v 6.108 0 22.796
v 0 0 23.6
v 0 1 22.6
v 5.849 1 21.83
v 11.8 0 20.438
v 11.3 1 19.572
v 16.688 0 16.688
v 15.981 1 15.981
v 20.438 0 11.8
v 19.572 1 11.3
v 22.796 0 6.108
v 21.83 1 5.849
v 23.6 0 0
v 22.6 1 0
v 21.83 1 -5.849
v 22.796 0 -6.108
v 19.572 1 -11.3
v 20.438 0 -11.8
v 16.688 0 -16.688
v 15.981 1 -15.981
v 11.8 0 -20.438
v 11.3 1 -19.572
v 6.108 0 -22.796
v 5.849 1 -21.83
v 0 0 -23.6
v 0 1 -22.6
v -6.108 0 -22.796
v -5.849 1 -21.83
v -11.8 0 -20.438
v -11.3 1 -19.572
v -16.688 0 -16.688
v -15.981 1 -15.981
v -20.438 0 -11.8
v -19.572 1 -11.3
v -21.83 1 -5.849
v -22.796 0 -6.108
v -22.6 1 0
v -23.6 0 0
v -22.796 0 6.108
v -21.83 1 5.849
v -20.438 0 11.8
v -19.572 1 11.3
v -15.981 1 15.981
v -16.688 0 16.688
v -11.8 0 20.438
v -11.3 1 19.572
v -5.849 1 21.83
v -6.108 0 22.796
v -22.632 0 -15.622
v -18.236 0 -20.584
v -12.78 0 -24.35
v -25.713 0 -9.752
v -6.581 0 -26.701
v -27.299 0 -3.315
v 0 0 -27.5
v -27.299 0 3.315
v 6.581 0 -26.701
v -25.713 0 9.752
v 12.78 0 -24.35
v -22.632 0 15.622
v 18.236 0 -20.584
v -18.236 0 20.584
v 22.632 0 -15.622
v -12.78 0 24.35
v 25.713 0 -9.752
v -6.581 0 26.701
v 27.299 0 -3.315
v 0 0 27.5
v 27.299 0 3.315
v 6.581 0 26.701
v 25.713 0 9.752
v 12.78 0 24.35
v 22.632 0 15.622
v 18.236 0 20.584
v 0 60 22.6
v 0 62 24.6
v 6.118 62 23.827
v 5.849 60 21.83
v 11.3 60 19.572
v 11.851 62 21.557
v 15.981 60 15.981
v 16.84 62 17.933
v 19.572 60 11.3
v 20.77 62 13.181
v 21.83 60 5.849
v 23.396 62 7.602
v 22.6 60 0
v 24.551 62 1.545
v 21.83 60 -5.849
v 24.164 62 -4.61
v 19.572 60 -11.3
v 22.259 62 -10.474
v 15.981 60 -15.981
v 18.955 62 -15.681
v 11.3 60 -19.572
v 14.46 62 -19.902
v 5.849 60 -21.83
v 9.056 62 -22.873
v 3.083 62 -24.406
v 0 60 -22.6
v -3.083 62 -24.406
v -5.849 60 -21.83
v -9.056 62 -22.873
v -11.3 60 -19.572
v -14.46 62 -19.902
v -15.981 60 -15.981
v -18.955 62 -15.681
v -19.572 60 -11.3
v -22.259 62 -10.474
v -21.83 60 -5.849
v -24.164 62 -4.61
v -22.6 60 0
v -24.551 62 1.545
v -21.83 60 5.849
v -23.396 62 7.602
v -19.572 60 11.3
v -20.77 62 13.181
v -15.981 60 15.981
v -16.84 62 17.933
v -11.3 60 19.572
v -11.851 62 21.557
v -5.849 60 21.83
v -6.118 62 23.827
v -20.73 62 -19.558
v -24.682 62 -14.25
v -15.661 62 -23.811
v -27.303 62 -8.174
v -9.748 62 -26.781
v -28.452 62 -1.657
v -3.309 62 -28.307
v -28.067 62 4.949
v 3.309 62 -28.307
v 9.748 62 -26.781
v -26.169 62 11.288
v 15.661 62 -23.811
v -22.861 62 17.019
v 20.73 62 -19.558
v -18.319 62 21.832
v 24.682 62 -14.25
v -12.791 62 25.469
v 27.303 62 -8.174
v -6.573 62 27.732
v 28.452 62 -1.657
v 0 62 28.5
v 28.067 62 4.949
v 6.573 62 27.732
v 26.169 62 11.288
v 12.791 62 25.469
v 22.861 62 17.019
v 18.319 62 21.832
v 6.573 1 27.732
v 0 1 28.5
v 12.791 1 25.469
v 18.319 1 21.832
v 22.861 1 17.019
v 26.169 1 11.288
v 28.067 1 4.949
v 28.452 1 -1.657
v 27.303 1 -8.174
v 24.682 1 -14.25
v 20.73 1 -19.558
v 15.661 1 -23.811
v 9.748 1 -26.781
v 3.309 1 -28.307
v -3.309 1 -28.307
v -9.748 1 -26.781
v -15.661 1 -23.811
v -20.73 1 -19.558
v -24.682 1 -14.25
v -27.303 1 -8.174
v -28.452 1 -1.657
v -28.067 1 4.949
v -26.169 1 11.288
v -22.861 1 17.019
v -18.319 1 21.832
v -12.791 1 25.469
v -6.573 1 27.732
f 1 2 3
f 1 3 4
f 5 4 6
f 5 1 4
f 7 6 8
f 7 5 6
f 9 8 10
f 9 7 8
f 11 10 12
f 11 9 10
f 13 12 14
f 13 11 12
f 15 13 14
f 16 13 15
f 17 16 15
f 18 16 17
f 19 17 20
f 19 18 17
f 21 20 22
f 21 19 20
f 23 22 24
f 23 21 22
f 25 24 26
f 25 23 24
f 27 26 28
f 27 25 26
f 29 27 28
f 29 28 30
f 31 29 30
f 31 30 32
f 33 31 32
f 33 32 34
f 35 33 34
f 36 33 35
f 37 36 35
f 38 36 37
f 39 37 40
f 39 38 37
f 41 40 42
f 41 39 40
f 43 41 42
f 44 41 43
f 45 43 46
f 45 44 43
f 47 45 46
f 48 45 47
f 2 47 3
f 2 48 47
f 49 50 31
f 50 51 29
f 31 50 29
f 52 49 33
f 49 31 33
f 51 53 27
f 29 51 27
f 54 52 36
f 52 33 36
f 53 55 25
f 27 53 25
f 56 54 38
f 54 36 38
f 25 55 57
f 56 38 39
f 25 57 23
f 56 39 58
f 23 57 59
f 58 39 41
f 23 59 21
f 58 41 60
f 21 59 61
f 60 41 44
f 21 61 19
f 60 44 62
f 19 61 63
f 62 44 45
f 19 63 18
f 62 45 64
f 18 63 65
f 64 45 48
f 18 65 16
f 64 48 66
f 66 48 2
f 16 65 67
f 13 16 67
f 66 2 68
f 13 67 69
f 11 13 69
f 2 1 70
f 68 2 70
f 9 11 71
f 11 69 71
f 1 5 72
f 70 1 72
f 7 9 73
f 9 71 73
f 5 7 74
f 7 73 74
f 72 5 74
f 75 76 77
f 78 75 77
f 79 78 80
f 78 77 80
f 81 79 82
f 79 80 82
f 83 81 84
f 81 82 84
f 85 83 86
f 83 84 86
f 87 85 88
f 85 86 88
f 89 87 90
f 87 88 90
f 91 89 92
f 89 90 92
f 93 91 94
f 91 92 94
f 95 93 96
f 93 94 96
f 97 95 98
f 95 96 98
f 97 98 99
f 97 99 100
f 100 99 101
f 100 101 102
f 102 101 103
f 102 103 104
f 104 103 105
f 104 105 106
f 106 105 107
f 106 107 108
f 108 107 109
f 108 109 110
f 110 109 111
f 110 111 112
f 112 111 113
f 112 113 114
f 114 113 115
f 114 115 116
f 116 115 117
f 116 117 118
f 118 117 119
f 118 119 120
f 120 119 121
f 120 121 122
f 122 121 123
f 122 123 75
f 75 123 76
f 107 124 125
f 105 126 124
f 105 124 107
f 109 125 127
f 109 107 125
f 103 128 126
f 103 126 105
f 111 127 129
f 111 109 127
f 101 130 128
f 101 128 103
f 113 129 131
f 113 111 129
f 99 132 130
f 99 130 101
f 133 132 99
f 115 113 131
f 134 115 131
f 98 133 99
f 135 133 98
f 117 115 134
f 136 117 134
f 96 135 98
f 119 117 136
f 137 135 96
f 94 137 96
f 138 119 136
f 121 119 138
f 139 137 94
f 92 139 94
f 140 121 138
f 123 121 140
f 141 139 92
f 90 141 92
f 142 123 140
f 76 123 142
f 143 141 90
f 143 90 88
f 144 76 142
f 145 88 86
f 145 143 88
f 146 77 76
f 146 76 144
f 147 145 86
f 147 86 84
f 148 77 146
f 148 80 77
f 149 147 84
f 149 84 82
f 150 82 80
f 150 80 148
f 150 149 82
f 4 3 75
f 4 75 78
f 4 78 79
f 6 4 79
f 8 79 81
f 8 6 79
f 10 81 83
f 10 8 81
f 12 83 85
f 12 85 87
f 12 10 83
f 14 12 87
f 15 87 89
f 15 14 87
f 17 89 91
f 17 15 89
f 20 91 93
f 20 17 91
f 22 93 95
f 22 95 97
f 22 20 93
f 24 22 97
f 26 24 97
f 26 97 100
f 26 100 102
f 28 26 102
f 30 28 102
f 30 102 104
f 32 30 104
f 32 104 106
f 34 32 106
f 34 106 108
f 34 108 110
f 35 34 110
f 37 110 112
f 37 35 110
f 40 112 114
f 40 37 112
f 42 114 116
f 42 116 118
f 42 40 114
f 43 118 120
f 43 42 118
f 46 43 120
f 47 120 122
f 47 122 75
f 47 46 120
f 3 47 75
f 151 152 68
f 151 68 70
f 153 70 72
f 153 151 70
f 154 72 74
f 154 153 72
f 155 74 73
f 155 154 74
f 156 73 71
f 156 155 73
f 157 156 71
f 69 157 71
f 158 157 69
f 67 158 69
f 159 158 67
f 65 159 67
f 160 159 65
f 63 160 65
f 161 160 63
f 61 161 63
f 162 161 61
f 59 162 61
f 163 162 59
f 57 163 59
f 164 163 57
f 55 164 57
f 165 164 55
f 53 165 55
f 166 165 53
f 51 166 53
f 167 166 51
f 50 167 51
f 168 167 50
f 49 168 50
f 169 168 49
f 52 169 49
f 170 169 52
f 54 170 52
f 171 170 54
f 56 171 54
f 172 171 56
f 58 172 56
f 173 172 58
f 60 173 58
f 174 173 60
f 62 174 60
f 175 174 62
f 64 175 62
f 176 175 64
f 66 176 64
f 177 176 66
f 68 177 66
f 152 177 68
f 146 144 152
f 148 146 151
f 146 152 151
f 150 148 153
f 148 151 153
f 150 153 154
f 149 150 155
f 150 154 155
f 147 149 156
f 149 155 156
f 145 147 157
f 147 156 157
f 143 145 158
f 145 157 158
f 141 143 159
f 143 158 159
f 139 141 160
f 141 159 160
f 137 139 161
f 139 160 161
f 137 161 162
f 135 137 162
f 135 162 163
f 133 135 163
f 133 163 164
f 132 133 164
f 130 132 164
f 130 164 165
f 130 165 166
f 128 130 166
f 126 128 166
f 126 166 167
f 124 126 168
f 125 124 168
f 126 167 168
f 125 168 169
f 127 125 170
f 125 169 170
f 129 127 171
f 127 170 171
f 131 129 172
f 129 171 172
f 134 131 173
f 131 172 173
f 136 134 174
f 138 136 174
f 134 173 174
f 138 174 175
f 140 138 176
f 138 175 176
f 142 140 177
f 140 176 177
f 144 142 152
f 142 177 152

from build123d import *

# Parameters (mm, degrees)
SKETCH2_R           = 28.5
SKETCH2_R_2         = 22.6
BOSS_EXTRUDE1_DEPTH = 62
CHAMFER1_SIZE       = 2
CHAMFER2_SIZE       = 1
CHAMFER3_SIZE       = 1


with BuildPart() as part:
    # Sketch2 → Boss-Extrude1 (new body)
    with BuildSketch(Plane(origin=(0, 0, 0), x_dir=(1, 0, 0), z_dir=(0, 1, 0))):
        with Locations(Location((0, 0, 0), (0, 0, 270))):
            Circle(SKETCH2_R)
        with Locations(Location((0, 0, 0), (0, 0, 270))):
            Circle(SKETCH2_R_2, mode=Mode.SUBTRACT)
    extrude(amount=BOSS_EXTRUDE1_DEPTH)

    # Chamfer1
    chamfer1_edges = [part.edges().sort_by_distance(p)[0] for p in [
        (0, 62, -22.6),
    ]]
    chamfer(chamfer1_edges, length=CHAMFER1_SIZE)

    # Chamfer2
    chamfer2_edges = [part.edges().sort_by_distance(p)[0] for p in [
        (0, 0, -22.6),
    ]]
    chamfer(chamfer2_edges, length=CHAMFER2_SIZE)

    # Chamfer3
    chamfer3_edges = [part.edges().sort_by_distance(p)[0] for p in [
        (0, 0, -28.5),
    ]]
    chamfer(chamfer3_edges, length=CHAMFER3_SIZE)


solid = part.part
